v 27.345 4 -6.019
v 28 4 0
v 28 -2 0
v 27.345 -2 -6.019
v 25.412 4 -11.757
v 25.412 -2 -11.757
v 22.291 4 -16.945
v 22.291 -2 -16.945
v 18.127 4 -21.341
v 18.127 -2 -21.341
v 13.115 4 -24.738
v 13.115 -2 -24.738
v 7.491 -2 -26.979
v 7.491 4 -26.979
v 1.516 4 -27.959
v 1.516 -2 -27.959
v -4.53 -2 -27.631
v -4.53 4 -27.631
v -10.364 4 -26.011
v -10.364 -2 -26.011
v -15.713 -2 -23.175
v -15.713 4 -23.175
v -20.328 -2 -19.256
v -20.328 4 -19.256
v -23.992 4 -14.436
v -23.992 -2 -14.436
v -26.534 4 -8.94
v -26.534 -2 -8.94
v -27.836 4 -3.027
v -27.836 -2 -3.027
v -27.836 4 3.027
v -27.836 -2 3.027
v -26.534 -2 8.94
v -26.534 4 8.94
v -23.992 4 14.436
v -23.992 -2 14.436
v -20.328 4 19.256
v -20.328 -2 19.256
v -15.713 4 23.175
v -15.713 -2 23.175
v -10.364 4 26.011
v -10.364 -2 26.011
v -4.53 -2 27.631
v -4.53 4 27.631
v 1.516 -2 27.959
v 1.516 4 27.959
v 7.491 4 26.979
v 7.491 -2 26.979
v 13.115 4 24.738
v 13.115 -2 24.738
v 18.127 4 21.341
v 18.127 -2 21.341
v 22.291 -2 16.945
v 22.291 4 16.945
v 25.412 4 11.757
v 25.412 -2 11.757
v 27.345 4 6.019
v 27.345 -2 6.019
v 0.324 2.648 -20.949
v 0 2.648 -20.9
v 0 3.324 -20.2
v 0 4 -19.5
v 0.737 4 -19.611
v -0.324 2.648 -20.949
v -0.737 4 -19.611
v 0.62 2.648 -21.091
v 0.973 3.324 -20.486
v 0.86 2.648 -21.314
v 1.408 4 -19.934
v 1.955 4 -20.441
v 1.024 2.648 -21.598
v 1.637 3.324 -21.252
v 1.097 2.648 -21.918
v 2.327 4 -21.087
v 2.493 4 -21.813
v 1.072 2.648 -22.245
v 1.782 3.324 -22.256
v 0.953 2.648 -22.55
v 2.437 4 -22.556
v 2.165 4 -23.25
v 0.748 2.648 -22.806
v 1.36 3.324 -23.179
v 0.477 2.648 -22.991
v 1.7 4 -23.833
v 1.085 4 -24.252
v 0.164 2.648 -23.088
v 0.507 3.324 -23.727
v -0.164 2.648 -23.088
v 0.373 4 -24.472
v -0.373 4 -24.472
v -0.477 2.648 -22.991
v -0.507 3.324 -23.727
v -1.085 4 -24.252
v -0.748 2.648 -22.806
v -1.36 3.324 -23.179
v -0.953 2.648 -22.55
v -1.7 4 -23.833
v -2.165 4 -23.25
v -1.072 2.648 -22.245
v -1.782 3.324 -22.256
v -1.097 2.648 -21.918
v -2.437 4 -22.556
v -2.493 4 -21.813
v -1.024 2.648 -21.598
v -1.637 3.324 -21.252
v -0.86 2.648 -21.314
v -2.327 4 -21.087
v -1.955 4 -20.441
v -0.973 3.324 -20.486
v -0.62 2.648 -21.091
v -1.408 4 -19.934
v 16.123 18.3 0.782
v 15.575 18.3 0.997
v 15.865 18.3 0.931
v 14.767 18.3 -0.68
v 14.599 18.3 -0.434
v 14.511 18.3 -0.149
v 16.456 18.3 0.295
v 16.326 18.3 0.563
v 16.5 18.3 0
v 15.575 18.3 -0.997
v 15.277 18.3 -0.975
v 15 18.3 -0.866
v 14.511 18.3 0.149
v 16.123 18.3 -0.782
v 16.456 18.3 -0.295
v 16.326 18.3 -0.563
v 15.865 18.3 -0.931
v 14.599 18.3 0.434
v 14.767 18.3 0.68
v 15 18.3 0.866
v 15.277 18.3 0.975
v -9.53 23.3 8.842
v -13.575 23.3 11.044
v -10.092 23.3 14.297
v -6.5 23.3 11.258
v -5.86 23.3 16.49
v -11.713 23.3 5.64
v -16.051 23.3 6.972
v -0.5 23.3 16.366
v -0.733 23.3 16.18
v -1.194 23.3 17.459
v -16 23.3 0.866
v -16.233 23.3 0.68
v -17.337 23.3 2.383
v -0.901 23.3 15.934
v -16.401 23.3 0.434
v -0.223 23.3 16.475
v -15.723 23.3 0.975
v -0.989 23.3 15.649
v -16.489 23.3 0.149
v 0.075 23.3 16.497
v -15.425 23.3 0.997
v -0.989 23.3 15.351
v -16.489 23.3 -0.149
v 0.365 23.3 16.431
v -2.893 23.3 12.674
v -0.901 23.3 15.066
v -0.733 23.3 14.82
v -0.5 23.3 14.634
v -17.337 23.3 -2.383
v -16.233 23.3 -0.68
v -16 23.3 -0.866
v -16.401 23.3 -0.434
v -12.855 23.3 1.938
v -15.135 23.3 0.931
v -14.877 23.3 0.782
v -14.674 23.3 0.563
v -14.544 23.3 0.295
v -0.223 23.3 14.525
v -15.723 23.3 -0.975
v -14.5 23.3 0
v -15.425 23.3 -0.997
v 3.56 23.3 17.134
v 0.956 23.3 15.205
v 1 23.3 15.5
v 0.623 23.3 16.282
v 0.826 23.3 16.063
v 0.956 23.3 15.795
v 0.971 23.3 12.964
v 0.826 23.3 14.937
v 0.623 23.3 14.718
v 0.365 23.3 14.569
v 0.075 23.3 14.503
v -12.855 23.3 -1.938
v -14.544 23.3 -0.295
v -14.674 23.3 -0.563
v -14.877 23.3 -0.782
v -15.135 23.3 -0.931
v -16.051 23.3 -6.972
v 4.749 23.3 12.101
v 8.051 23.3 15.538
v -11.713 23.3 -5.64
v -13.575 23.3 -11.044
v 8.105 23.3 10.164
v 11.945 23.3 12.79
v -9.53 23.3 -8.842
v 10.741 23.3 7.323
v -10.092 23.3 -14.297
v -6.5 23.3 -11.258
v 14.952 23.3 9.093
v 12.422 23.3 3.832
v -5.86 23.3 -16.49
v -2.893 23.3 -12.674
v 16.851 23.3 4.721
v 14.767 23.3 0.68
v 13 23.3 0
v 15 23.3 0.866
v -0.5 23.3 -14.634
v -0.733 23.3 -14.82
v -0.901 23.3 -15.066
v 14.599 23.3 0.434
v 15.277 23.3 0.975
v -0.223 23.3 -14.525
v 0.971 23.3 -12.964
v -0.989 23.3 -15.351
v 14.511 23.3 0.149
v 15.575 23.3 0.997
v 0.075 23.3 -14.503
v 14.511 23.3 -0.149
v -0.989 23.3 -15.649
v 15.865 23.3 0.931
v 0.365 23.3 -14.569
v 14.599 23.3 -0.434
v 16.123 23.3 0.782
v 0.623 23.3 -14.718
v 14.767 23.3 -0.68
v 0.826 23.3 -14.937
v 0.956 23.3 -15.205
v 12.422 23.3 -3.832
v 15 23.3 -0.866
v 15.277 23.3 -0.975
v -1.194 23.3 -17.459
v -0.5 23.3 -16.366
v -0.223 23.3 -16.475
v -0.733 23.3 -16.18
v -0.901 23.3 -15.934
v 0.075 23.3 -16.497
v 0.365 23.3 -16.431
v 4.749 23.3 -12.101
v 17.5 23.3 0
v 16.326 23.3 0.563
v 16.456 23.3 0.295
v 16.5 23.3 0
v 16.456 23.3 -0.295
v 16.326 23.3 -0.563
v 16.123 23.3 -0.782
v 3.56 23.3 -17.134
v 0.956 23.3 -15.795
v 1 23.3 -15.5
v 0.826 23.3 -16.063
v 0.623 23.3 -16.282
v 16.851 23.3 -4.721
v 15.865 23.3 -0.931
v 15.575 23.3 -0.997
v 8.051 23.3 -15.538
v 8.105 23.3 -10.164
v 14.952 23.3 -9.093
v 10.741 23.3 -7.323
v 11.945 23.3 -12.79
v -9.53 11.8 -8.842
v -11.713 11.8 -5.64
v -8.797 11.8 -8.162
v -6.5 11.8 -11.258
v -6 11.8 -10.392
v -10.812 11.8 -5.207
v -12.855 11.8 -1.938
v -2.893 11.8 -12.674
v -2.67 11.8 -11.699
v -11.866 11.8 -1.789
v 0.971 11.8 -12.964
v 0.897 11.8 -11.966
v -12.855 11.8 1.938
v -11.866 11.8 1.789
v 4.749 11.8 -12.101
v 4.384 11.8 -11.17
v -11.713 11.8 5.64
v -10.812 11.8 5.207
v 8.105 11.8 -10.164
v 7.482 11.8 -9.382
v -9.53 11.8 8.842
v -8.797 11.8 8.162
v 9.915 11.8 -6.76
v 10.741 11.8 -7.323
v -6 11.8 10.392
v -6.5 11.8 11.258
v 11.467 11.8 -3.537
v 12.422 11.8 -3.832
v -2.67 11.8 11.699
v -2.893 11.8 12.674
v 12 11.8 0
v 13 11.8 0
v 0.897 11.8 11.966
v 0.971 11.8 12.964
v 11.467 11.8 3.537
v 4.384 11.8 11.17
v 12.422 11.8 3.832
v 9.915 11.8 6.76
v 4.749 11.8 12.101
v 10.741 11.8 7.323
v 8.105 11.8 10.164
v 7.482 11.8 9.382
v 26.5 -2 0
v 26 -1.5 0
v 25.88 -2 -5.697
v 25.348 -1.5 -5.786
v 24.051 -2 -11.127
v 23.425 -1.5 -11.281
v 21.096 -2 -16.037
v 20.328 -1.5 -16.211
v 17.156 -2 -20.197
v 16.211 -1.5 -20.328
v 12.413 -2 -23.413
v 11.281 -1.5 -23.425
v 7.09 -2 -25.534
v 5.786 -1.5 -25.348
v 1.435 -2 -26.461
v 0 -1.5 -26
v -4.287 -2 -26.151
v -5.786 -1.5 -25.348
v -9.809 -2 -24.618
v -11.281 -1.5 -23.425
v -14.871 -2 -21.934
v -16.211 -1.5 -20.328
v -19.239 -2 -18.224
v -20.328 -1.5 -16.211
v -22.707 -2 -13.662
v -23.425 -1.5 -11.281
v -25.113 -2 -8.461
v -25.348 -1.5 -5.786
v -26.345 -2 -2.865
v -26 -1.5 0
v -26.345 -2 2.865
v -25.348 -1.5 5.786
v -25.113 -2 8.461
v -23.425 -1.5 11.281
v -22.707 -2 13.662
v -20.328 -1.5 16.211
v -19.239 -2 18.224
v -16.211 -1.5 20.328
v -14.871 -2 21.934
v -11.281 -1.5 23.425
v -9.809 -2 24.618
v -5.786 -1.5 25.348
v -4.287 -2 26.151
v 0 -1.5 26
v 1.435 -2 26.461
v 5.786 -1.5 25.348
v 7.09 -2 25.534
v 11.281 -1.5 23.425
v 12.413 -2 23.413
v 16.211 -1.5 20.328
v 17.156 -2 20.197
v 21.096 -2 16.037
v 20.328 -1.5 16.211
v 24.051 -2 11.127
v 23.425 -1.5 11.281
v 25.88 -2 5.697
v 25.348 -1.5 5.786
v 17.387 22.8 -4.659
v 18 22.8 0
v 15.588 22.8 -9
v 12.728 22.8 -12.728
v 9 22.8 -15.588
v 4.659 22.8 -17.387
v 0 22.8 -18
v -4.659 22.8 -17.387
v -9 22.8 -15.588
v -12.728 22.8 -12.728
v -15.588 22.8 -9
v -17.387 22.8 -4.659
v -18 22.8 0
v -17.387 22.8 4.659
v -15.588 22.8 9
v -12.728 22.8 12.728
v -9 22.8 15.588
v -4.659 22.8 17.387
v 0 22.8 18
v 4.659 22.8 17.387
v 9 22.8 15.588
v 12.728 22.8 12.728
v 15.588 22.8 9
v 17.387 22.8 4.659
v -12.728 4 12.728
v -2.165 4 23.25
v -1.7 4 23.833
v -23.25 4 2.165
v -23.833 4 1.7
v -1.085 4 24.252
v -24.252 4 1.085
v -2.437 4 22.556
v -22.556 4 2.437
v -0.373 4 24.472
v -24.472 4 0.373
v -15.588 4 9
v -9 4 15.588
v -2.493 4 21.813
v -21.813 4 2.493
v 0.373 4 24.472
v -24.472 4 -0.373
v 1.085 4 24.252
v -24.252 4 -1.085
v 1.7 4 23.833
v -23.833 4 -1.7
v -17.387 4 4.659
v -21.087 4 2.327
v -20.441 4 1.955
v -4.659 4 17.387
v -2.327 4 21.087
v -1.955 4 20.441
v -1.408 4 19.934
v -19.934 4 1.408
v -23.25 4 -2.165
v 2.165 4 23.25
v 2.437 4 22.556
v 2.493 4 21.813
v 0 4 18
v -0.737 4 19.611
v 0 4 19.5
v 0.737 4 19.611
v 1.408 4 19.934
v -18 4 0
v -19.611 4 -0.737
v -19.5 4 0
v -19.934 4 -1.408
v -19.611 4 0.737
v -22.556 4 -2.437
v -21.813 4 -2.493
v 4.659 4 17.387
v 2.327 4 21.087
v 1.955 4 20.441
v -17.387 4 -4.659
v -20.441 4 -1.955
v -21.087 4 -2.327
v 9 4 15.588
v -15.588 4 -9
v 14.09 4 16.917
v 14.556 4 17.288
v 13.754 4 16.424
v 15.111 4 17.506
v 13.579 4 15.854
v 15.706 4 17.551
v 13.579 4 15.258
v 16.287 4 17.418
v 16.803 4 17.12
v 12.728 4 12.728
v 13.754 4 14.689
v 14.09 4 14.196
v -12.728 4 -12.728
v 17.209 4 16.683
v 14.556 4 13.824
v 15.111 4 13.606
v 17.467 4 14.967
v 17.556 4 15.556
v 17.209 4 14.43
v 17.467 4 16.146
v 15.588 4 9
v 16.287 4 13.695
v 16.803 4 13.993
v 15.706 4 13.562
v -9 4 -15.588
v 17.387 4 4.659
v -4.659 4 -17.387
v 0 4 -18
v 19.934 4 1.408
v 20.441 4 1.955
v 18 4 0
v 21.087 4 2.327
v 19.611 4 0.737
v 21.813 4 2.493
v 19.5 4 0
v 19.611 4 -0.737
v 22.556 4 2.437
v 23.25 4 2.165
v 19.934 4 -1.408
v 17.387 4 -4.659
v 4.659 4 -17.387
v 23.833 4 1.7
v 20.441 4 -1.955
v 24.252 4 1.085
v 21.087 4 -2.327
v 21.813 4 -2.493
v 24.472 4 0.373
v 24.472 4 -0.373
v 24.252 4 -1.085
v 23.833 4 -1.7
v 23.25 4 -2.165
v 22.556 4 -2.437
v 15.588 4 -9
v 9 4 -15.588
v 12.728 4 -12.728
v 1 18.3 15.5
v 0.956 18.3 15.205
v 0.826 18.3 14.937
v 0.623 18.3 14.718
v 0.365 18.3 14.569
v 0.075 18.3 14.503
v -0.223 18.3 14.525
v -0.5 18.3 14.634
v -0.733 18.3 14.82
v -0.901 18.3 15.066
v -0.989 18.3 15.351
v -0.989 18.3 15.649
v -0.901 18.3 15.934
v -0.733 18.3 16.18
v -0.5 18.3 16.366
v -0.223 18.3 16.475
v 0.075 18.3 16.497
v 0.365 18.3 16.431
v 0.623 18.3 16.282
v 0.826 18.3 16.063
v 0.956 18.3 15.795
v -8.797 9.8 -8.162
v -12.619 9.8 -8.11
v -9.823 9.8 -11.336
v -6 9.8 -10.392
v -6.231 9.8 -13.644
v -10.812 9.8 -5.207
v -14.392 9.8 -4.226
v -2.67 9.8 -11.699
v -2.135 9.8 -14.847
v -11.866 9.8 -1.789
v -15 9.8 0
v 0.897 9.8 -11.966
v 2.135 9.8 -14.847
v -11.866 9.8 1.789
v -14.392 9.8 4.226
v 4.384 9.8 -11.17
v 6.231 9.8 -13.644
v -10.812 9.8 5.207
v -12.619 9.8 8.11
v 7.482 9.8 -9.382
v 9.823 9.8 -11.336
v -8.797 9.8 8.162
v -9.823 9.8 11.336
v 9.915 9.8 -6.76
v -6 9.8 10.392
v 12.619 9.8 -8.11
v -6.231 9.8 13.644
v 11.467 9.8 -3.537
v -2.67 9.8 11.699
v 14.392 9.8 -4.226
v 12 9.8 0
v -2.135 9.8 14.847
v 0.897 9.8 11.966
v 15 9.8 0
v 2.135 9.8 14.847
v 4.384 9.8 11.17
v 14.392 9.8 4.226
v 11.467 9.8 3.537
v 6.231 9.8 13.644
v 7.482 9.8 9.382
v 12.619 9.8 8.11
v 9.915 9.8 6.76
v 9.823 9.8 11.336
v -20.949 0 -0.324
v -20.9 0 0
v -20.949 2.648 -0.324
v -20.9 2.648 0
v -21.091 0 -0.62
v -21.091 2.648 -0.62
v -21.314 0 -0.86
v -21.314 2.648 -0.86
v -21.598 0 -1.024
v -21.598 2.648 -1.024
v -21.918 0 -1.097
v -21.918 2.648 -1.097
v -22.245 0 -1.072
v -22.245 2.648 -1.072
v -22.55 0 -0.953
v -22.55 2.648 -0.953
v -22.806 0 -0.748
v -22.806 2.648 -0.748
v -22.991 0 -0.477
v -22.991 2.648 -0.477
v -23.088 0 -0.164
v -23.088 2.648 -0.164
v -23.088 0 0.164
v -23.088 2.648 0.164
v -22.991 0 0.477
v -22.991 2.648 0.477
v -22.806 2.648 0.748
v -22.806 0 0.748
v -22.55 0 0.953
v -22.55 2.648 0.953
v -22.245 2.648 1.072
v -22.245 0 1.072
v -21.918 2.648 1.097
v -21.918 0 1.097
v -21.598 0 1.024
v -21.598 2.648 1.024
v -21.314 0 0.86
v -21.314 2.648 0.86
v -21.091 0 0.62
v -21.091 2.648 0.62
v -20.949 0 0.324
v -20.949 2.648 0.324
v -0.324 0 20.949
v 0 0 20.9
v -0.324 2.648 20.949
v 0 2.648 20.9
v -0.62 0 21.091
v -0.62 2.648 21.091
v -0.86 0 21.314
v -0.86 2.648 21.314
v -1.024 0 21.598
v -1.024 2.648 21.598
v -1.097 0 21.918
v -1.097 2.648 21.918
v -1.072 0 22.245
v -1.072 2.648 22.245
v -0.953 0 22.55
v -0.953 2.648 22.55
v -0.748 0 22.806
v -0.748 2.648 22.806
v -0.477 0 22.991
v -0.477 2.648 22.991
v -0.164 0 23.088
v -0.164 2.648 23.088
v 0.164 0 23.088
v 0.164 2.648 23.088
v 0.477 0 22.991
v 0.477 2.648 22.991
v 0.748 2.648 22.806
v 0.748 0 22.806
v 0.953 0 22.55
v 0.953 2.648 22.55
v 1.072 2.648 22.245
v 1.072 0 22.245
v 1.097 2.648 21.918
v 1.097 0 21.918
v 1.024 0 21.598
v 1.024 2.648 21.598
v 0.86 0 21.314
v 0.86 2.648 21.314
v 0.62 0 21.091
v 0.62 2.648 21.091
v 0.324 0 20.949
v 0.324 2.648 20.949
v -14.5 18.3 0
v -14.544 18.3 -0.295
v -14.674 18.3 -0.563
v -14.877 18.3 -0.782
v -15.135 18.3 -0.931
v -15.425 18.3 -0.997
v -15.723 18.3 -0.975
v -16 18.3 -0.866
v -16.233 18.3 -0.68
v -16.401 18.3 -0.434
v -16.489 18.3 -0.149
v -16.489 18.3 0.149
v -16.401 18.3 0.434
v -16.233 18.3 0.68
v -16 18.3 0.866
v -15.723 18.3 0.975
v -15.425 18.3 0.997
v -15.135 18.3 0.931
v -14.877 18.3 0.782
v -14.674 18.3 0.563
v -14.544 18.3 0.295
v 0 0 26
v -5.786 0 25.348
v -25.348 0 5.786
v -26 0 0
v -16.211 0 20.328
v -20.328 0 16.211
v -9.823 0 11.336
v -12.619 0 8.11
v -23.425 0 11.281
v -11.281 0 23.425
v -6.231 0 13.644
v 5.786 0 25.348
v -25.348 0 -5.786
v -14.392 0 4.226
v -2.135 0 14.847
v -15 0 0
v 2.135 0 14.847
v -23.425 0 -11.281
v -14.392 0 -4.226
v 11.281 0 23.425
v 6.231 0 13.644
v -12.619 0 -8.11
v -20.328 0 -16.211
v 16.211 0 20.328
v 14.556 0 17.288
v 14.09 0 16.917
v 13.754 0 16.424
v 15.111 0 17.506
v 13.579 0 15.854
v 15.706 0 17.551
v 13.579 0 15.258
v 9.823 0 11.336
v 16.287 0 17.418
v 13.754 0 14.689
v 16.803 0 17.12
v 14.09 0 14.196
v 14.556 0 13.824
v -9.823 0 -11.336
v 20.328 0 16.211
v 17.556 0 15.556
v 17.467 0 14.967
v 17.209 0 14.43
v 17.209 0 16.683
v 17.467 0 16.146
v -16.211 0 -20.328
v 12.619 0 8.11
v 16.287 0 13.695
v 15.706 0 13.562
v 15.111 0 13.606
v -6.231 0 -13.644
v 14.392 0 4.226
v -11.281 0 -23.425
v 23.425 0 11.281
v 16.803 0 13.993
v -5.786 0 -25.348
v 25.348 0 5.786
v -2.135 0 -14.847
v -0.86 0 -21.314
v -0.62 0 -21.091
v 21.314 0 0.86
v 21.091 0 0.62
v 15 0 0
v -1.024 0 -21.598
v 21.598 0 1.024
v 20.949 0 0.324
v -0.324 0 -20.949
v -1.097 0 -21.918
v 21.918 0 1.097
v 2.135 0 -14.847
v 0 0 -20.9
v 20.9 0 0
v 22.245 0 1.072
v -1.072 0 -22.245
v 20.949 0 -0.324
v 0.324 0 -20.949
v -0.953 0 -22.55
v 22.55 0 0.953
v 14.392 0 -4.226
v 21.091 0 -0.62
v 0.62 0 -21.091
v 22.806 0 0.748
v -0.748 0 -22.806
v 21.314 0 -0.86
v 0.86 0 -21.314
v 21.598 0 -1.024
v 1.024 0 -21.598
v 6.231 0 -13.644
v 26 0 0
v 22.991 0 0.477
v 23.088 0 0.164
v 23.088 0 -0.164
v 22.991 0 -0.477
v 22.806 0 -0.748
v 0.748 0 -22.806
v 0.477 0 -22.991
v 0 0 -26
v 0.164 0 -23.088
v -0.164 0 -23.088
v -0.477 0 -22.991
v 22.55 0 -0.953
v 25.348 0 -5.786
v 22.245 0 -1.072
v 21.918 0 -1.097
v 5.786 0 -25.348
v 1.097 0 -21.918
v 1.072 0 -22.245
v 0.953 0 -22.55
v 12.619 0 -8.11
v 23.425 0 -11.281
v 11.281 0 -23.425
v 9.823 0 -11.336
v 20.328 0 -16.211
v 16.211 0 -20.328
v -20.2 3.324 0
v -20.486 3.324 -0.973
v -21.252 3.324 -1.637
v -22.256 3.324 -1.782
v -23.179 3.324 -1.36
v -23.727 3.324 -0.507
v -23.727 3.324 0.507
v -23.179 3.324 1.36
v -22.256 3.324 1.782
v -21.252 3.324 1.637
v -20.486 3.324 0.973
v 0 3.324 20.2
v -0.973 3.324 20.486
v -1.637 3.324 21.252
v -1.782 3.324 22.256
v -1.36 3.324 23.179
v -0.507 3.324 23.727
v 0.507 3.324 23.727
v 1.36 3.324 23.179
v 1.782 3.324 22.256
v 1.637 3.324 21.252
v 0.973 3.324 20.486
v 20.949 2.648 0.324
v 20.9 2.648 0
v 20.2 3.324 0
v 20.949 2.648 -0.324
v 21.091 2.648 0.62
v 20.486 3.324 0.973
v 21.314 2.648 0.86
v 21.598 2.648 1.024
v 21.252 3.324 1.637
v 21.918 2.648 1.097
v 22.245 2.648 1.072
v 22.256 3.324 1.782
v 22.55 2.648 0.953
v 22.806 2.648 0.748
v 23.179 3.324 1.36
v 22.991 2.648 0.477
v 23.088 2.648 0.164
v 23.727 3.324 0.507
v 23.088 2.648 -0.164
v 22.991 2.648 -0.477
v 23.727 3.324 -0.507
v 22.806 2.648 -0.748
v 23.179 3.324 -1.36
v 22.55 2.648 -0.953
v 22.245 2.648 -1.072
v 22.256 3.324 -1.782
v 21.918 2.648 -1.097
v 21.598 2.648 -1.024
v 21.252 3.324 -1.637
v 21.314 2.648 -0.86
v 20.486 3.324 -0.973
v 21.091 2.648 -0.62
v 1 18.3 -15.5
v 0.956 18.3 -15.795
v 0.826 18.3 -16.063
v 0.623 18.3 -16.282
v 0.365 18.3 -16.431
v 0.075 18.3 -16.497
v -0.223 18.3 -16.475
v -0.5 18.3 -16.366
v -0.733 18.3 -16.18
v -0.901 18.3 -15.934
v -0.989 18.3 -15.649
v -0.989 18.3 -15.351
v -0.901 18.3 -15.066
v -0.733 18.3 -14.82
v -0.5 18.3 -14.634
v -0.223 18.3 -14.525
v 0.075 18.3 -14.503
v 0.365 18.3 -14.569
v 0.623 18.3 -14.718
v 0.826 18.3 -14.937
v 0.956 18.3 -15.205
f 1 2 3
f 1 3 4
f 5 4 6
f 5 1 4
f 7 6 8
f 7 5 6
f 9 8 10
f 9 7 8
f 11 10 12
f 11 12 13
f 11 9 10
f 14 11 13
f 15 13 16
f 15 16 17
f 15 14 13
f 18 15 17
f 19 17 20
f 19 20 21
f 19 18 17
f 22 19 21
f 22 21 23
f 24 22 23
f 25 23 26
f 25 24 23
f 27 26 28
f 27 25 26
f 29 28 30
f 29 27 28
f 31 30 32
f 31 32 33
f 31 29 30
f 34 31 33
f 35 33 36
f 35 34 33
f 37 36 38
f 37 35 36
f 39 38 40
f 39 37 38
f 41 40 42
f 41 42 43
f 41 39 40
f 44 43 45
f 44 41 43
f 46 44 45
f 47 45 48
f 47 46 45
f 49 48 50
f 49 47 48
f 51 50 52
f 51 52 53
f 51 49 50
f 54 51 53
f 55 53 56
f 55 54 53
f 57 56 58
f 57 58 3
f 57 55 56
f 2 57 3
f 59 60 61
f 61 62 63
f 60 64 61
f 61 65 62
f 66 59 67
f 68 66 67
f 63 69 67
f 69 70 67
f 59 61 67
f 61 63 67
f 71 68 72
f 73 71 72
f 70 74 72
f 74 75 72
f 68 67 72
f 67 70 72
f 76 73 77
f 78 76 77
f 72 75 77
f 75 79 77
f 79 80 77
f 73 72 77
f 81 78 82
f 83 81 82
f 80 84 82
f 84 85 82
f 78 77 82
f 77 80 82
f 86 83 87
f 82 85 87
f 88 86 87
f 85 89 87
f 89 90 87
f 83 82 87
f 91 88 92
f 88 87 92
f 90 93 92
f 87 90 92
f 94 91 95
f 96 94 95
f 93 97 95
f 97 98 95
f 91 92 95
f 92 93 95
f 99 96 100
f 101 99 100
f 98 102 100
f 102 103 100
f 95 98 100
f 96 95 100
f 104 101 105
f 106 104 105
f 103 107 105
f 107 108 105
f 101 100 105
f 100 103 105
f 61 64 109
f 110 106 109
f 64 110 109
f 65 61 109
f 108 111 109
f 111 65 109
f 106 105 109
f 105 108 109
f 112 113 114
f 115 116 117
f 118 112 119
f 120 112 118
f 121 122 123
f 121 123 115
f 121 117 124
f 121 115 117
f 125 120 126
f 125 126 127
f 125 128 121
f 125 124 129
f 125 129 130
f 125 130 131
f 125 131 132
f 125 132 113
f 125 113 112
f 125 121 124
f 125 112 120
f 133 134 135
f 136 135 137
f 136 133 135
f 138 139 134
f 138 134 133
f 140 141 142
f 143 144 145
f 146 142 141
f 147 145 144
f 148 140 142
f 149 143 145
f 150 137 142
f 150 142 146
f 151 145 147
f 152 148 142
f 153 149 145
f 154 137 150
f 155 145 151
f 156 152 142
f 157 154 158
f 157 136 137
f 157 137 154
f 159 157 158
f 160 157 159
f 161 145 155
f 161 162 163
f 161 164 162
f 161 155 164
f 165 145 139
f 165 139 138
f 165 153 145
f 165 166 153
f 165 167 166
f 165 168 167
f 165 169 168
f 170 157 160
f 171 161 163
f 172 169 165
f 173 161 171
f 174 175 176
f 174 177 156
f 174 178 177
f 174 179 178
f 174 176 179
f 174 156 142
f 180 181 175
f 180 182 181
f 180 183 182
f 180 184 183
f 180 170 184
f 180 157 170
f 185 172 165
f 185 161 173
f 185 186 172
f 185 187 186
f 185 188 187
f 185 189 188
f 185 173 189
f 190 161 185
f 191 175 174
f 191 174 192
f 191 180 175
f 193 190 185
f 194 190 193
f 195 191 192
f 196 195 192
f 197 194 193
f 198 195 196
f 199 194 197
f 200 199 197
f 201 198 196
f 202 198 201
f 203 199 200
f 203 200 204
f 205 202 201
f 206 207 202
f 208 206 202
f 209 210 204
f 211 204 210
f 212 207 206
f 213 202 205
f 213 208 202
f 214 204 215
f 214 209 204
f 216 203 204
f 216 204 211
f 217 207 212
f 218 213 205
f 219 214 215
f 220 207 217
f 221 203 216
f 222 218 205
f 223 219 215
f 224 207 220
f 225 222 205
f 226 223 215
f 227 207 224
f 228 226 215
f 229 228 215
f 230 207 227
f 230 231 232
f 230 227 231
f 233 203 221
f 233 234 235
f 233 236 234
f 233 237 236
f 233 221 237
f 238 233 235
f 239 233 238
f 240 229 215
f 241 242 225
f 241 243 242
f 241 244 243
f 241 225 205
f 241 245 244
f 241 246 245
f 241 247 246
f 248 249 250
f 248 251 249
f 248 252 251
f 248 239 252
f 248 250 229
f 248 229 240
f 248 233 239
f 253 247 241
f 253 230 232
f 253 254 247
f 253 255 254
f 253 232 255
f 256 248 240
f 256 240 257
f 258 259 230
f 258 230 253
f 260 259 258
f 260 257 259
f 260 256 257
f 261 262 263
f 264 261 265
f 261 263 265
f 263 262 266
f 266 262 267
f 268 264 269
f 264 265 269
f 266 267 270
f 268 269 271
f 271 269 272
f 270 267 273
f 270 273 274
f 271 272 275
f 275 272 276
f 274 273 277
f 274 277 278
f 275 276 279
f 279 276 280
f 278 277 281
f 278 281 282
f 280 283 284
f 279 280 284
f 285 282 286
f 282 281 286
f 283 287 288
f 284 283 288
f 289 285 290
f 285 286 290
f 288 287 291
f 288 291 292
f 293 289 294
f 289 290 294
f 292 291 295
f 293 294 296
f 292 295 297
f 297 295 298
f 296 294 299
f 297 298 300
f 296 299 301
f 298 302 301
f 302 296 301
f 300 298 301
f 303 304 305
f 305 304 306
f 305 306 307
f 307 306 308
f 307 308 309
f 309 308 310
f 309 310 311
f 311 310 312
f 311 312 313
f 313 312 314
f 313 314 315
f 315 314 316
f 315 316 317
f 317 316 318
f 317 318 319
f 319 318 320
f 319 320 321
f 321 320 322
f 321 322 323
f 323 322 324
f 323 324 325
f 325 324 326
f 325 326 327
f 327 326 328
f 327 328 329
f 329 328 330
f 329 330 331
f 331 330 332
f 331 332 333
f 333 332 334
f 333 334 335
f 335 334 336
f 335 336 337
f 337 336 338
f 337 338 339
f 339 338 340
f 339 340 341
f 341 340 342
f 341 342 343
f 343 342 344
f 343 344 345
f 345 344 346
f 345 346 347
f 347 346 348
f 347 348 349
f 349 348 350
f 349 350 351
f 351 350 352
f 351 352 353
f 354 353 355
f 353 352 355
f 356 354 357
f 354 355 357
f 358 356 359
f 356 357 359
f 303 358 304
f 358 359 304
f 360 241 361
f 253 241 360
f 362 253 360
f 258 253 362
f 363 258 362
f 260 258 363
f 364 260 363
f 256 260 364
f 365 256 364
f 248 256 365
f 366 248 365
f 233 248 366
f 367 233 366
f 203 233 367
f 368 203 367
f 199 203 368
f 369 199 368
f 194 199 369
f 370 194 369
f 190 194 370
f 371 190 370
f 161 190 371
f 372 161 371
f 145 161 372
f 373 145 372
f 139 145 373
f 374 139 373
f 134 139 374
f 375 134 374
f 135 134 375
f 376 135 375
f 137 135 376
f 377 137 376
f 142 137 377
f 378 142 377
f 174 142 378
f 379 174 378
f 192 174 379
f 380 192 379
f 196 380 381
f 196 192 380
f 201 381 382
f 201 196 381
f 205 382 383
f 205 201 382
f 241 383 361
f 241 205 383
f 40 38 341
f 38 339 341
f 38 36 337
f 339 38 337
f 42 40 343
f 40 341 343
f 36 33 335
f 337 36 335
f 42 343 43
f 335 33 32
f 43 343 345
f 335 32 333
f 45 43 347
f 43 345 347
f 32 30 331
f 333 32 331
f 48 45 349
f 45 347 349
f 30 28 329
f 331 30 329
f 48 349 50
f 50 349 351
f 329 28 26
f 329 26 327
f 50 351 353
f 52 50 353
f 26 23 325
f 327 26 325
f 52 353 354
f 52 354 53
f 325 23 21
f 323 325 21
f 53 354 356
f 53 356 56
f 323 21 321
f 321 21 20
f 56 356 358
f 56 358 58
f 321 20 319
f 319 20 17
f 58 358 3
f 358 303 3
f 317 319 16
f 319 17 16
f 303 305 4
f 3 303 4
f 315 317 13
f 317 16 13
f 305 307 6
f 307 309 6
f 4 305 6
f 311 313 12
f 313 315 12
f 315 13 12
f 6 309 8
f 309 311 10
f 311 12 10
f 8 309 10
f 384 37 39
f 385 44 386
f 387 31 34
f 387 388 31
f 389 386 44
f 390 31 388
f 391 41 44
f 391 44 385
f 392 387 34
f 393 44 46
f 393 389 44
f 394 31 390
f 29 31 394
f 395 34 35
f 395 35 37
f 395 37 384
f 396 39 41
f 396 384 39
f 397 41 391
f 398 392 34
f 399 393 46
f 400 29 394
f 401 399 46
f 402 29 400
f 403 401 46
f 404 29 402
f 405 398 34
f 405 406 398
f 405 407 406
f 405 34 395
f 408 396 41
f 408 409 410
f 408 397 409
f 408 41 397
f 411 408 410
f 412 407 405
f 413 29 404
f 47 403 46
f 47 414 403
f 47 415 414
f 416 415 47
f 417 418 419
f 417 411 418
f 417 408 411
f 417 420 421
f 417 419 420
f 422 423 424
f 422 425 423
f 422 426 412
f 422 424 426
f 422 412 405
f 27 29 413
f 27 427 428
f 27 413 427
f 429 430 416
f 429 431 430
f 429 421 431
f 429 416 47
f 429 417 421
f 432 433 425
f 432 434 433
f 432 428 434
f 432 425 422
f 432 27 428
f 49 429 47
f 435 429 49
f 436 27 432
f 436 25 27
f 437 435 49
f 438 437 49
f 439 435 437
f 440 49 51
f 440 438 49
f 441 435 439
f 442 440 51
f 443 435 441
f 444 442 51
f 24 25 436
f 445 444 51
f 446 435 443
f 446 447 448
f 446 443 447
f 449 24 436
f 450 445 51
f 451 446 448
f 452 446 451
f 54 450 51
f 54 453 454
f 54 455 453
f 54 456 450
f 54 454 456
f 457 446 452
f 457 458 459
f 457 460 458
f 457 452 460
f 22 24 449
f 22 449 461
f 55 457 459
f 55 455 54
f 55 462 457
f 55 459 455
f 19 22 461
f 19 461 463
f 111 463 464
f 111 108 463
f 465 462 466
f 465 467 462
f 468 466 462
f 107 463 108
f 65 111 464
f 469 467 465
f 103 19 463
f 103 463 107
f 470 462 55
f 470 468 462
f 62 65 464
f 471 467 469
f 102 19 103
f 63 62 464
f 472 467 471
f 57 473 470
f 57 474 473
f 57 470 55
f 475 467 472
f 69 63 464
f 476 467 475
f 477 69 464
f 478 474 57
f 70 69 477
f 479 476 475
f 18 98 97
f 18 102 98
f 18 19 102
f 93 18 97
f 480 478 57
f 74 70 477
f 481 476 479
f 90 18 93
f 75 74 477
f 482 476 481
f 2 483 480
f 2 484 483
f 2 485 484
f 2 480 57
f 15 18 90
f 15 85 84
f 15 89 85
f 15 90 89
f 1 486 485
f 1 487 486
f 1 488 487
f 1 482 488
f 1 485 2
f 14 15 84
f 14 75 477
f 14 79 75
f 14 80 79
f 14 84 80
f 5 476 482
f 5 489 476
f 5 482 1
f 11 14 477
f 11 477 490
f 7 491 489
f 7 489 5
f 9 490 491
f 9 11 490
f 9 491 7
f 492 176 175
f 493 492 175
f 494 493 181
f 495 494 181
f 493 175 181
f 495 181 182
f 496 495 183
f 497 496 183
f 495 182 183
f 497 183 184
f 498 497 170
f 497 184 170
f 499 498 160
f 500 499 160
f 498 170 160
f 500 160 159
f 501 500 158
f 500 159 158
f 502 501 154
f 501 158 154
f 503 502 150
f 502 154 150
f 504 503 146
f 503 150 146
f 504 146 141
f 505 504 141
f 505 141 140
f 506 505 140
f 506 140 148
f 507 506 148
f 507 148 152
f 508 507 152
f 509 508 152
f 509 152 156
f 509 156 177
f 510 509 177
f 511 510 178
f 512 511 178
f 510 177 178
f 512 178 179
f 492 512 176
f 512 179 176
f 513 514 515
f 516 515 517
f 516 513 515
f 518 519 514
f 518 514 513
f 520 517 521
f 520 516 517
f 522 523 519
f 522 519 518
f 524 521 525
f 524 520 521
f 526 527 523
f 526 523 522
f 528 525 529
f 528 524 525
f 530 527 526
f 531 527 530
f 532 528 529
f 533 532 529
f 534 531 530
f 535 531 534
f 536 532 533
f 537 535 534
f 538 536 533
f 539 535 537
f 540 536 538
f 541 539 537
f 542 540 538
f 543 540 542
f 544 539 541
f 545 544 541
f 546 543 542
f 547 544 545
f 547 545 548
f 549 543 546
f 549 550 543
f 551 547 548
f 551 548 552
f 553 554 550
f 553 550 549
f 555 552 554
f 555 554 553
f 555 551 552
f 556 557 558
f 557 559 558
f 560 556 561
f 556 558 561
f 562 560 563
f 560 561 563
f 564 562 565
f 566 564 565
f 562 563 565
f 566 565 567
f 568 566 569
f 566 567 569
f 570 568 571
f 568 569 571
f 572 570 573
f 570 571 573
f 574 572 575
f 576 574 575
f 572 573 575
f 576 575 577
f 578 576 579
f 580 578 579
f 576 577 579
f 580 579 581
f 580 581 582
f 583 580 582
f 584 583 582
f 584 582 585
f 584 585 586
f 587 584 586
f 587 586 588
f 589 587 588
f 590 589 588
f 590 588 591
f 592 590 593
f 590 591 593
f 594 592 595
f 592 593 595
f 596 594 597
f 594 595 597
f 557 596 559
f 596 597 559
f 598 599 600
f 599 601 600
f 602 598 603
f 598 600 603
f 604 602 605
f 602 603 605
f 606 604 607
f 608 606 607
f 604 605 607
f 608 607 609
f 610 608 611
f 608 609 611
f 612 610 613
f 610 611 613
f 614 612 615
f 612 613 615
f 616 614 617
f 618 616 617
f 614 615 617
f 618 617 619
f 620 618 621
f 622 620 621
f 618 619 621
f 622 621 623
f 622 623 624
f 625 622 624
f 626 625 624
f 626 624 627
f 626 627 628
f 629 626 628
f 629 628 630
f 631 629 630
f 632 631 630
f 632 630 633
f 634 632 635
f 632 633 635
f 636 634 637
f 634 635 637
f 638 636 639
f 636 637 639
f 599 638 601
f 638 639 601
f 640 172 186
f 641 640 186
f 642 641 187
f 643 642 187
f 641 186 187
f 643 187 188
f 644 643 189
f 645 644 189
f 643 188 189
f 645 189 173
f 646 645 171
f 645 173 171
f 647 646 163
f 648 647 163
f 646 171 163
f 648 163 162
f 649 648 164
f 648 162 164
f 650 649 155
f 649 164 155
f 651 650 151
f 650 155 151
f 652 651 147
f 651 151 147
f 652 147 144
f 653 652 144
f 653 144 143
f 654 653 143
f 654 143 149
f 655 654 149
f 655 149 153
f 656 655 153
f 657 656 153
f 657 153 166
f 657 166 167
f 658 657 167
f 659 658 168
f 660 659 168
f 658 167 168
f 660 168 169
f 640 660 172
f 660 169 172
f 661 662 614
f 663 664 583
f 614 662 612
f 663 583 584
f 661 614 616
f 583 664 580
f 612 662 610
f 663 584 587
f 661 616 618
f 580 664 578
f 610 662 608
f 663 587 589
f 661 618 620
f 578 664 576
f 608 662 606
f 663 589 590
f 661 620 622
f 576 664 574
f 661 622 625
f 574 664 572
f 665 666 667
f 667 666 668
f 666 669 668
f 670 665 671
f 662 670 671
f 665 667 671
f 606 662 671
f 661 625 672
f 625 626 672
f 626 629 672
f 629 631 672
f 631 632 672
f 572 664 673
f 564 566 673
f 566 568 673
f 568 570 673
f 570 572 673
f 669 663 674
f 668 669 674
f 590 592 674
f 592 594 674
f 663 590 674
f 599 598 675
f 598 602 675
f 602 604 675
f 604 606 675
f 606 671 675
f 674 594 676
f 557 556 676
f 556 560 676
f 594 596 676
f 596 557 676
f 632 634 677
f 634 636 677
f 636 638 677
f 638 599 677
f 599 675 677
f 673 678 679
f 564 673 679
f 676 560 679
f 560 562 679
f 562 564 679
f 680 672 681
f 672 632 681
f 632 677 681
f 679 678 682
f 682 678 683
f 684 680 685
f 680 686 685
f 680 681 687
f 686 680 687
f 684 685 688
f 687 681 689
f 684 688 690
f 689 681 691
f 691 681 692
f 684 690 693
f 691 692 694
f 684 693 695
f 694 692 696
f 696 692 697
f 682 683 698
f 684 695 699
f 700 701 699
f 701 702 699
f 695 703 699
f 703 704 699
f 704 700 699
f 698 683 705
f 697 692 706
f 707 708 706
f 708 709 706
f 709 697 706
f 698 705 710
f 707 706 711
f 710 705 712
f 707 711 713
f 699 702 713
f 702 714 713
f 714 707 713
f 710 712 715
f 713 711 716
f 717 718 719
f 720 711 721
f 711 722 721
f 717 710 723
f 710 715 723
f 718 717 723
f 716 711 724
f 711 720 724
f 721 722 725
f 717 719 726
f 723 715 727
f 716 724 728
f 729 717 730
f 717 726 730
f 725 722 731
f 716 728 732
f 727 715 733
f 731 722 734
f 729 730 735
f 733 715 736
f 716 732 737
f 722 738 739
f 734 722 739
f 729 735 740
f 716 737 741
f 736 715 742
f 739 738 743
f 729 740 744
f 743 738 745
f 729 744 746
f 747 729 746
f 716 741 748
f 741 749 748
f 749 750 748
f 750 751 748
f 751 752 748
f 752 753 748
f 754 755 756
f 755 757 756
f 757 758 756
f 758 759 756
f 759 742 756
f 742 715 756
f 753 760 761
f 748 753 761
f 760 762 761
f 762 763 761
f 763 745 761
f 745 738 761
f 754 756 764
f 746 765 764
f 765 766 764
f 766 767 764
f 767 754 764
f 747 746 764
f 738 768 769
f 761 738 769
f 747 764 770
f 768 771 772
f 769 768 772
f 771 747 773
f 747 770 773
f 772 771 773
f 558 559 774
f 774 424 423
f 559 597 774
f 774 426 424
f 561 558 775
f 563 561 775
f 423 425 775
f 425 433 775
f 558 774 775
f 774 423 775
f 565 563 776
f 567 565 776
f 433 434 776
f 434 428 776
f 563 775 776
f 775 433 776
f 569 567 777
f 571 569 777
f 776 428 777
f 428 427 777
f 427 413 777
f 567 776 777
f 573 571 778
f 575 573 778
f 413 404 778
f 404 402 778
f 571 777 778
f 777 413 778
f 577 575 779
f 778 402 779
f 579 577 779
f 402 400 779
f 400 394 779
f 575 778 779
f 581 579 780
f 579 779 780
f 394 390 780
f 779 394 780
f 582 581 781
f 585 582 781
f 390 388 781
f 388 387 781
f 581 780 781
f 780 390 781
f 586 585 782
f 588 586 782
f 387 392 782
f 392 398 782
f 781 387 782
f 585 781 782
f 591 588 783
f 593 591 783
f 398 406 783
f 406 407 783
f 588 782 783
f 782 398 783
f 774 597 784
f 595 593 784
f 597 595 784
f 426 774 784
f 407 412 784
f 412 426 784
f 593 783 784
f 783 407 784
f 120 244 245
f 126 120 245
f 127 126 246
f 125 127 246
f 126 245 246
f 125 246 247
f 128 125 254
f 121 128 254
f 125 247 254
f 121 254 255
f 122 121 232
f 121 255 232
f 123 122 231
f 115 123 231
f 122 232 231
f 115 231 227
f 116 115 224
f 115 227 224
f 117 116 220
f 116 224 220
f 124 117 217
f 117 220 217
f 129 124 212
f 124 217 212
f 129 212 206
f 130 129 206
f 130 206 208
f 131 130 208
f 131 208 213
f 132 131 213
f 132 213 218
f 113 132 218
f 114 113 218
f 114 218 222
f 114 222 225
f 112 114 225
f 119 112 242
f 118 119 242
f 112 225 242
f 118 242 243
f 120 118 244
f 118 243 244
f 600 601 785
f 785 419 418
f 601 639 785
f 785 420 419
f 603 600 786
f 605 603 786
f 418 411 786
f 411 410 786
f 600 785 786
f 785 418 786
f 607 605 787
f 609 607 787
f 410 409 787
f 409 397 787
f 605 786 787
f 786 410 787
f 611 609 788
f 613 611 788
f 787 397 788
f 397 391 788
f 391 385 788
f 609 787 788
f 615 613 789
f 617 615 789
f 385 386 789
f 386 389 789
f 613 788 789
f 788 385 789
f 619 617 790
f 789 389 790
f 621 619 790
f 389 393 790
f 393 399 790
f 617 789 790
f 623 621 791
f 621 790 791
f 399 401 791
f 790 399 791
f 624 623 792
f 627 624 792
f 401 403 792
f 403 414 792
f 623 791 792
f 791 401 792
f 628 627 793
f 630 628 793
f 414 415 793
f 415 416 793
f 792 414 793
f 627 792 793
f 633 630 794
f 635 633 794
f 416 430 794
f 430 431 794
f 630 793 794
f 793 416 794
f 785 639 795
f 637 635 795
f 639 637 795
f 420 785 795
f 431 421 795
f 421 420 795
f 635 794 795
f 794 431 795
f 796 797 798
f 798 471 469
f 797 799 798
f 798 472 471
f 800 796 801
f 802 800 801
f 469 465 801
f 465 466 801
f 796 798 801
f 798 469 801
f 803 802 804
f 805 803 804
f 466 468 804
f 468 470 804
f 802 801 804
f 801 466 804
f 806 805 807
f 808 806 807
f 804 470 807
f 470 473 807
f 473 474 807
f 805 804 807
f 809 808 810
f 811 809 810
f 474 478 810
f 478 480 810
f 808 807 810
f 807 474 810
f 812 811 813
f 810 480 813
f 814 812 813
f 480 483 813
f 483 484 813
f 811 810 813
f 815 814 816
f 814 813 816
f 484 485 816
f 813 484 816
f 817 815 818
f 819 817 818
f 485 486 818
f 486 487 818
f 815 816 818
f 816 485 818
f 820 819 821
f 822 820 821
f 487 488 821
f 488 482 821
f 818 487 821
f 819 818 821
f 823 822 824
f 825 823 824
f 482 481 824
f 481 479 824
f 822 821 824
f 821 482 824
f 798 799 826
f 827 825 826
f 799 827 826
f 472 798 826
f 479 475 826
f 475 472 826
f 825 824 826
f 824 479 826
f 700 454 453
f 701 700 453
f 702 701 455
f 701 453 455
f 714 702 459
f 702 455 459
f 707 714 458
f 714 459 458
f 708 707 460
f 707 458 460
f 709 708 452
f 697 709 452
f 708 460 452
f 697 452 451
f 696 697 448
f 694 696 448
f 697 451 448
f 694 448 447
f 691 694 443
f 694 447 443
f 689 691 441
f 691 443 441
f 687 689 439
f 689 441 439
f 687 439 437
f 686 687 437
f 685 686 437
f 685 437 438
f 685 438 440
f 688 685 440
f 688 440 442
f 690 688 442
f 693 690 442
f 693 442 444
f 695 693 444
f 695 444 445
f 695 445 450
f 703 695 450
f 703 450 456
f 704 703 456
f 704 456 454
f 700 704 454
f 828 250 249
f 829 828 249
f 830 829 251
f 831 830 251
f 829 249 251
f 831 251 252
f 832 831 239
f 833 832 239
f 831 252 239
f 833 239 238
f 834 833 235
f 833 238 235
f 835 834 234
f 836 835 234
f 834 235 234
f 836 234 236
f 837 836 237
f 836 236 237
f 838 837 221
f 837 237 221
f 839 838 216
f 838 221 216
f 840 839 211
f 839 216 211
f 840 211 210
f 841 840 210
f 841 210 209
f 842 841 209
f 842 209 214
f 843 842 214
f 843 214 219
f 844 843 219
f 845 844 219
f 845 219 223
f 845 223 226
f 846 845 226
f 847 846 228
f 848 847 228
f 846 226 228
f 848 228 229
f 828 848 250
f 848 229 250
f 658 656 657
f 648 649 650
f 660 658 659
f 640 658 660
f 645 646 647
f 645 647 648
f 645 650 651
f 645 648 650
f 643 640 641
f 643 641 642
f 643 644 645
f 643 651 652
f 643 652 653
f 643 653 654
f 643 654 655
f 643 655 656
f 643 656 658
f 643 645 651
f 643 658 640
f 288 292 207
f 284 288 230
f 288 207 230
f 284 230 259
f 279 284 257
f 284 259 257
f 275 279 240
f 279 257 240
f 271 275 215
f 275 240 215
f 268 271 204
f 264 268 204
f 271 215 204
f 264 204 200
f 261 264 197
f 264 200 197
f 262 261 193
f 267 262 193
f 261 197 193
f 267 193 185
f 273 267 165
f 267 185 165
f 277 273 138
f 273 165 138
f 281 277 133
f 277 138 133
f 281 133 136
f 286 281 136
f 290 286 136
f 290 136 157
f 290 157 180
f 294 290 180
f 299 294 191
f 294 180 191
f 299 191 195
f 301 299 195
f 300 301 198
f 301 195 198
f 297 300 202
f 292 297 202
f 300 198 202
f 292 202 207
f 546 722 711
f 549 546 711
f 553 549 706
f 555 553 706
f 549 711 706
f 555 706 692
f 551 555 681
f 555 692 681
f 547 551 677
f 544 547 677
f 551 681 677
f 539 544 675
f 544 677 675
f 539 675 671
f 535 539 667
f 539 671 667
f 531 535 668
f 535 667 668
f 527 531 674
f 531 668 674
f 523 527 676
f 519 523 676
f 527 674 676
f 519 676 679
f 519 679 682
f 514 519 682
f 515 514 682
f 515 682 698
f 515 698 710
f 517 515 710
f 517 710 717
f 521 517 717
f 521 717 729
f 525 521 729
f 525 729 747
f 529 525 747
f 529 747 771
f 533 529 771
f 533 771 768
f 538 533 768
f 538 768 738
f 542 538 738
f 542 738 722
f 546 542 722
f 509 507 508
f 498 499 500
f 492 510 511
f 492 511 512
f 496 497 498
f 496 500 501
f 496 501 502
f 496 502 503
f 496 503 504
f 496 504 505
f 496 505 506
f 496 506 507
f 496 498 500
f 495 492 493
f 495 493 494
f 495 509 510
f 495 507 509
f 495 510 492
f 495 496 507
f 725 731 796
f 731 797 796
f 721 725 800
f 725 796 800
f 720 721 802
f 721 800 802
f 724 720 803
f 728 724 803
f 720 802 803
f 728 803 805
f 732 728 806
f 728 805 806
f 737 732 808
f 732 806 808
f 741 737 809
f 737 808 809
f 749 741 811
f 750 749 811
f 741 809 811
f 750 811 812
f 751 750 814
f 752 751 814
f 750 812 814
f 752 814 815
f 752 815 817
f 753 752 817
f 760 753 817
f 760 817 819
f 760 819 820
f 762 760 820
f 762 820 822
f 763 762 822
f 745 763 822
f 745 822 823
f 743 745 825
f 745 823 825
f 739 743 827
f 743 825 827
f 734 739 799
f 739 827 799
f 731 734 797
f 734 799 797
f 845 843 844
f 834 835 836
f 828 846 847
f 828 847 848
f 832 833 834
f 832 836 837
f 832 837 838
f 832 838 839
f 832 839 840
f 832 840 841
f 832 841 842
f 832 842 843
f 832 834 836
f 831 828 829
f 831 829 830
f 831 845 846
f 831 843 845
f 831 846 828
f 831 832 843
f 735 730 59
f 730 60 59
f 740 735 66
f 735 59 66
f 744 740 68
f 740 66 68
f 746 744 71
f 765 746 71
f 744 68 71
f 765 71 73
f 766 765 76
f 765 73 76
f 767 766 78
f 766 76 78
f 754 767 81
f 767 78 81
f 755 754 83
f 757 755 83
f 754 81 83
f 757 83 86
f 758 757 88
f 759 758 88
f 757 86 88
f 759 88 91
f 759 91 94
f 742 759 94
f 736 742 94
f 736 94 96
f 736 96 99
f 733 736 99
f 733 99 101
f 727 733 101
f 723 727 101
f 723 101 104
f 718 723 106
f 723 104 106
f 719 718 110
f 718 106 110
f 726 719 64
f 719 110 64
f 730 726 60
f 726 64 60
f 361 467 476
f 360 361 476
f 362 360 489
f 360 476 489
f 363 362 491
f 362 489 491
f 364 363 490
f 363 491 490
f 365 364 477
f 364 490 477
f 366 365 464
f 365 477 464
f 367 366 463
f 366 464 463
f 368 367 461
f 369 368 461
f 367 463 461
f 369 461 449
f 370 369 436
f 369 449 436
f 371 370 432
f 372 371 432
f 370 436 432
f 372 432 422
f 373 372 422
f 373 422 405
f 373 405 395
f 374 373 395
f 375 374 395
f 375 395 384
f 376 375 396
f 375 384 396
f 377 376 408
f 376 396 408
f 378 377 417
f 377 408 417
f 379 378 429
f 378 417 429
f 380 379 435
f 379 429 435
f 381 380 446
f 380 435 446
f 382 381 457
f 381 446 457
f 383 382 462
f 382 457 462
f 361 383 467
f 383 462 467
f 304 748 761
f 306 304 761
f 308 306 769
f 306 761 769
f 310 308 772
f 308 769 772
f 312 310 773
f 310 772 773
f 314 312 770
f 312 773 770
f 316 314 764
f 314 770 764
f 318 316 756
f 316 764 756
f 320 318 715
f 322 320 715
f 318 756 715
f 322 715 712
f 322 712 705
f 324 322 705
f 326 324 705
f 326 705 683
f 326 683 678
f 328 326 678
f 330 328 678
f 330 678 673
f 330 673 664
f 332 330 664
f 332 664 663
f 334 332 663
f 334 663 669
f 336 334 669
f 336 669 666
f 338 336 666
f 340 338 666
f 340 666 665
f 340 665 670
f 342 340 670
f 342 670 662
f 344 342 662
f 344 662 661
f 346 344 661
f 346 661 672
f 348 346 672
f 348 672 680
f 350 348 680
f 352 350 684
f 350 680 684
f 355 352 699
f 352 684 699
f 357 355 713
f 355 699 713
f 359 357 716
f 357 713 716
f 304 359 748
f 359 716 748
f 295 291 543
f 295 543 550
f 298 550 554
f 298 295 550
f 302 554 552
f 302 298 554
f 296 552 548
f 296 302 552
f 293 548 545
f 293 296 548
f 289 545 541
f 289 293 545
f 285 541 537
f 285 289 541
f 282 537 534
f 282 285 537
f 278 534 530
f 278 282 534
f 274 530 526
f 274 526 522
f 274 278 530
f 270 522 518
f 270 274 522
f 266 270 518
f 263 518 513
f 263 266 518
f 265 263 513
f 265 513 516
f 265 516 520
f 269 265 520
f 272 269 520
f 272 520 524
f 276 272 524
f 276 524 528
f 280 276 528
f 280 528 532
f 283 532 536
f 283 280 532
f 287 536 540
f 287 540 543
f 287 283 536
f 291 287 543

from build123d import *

# Parameters (mm, degrees)
SKETCH_1_R               = 26
EXTRUDE_1_DEPTH          = 4
SKETCH_2_R               = 18
EXTRUDE_2_DEPTH          = 19.3
SKETCH_3_R               = 13
CUT_EXTRUDE_1_DEPTH      = 10.3
SKETCH_6_R               = 13
CUT_EXTRUDE_4_DEPTH      = 14
SKETCH_7_R               = 1
CUT_EXTRUDE_5_DEPTH      = 5
SKETCH_8_R               = 28
SKETCH_8_R_2             = 26
EXTRUDE_3_DEPTH          = 6
CHAMFER_1_SIZE           = 0.5
CHAMFER_2_SIZE           = 0.5
PATTERN_CIRCULAR_1_COUNT = 4
SKETCH_10_R              = 15
CUT_EXTRUDE_7_DEPTH      = 11.8
SKETCH_11_R              = 15
SKETCH_11_R_2            = 12
EXTRUDE_4_DEPTH          = 2
SKETCH_12_R              = 2
CUT_EXTRUDE_8_DEPTH      = 10


with BuildPart() as part:
    # Эскиз1 → Бобышка-Вытянуть1 (new body)
    with BuildSketch(Plane(origin=(0, 0, 0), x_dir=(1, 0, 0), z_dir=(0, 1, 0))):
        Circle(SKETCH_1_R)
    extrude(amount=EXTRUDE_1_DEPTH)

    # Эскиз2 → Бобышка-Вытянуть2 (add)
    with BuildSketch(Plane(origin=(0, 4, 0), x_dir=(1, 0, 0), z_dir=(0, 1, 0))):
        Circle(SKETCH_2_R)
    extrude(amount=EXTRUDE_2_DEPTH)

    # Эскиз3 → Вырез-Вытянуть1 (cut)
    with BuildSketch(Plane(origin=(0, 23.3, 0), x_dir=(1, 0, 0), z_dir=(0, 1, 0))):
        Circle(SKETCH_3_R)
    extrude(amount=-CUT_EXTRUDE_1_DEPTH, mode=Mode.SUBTRACT)

    # Эскиз6 → Вырез-Вытянуть4 (cut, through all)
    with BuildSketch(Plane(origin=(0, 13, 0), x_dir=(1, 0, 0), z_dir=(0, 1, 0))):
        Circle(SKETCH_6_R)
    extrude(amount=-CUT_EXTRUDE_4_DEPTH, mode=Mode.SUBTRACT)

    # Эскиз7 → Вырез-Вытянуть5 (cut)
    with BuildSketch(Plane(origin=(0, 23.3, 0), x_dir=(1, 0, 0), z_dir=(0, 1, 0))):
        with Locations((-15.5, 0)):
            Circle(SKETCH_7_R)
        with Locations((0, 15.5)):
            Circle(SKETCH_7_R)
        with Locations((15.5, 0)):
            Circle(SKETCH_7_R)
        with Locations((0, -15.5)):
            Circle(SKETCH_7_R)
    extrude(amount=-CUT_EXTRUDE_5_DEPTH, mode=Mode.SUBTRACT)

    # Эскиз8 → Бобышка-Вытянуть3 (add)
    with BuildSketch(Plane(origin=(0, 4, 0), x_dir=(1, 0, 0), z_dir=(0, 1, 0))):
        Circle(SKETCH_8_R)
        Circle(SKETCH_8_R_2, mode=Mode.SUBTRACT)
    extrude(amount=-EXTRUDE_3_DEPTH)

    # Фаска1
    chamfer_1_edges = [part.edges().sort_by_distance(p)[0] for p in [
        (-26, -2, 0),
    ]]
    chamfer(chamfer_1_edges, length=CHAMFER_1_SIZE)

    # Фаска2
    chamfer_2_edges = [part.edges().sort_by_distance(p)[0] for p in [
        (-18, 23.3, 0),
    ]]
    chamfer(chamfer_2_edges, length=CHAMFER_2_SIZE)

    # Эскиз9 → Вырез-Повернуть2 (revolve, cut)
    with BuildSketch(Plane(origin=(0, 0, 0), x_dir=(0, 0, -1), z_dir=(1, 0, 0))):
        Polygon((-20.9, 2.648035715), (-19.5, 4), (-22, 4), (-22, 2.648035715), (-22, -2), (-20.9, -2), align=None)
    cut_revolve_2 = revolve(axis=Axis((0, -20.768821294, 22), (0, 1, 0)), mode=Mode.SUBTRACT)

    # Круговой массив1: Вырез-Повернуть2 ×4 about axis
    pattern_circular_1_axis = Axis((0, 0, 0), (0, 1, 0))
    for i in range(1, PATTERN_CIRCULAR_1_COUNT):
        add(cut_revolve_2.rotate(pattern_circular_1_axis, i * 360 / PATTERN_CIRCULAR_1_COUNT), mode=Mode.SUBTRACT)

    # Эскиз10 → Вырез-Вытянуть7 (cut)
    with BuildSketch(Plane.XZ):
        Circle(SKETCH_10_R)
    extrude(amount=-CUT_EXTRUDE_7_DEPTH, mode=Mode.SUBTRACT)

    # Эскиз11 → Бобышка-Вытянуть4 (add)
    with BuildSketch(Plane.XZ.offset(-11.8)):
        Circle(SKETCH_11_R)
        Circle(SKETCH_11_R_2, mode=Mode.SUBTRACT)
    extrude(amount=EXTRUDE_4_DEPTH)

    # Эскиз12 → Вырез-Вытянуть8 (cut)
    with BuildSketch(Plane(origin=(0, 4, 0), x_dir=(1, 0, 0), z_dir=(0, 1, 0))):
        with Locations((15.556349186, -15.556349186)):
            Circle(SKETCH_12_R)
    extrude(amount=-CUT_EXTRUDE_8_DEPTH, mode=Mode.SUBTRACT)


solid = part.part
